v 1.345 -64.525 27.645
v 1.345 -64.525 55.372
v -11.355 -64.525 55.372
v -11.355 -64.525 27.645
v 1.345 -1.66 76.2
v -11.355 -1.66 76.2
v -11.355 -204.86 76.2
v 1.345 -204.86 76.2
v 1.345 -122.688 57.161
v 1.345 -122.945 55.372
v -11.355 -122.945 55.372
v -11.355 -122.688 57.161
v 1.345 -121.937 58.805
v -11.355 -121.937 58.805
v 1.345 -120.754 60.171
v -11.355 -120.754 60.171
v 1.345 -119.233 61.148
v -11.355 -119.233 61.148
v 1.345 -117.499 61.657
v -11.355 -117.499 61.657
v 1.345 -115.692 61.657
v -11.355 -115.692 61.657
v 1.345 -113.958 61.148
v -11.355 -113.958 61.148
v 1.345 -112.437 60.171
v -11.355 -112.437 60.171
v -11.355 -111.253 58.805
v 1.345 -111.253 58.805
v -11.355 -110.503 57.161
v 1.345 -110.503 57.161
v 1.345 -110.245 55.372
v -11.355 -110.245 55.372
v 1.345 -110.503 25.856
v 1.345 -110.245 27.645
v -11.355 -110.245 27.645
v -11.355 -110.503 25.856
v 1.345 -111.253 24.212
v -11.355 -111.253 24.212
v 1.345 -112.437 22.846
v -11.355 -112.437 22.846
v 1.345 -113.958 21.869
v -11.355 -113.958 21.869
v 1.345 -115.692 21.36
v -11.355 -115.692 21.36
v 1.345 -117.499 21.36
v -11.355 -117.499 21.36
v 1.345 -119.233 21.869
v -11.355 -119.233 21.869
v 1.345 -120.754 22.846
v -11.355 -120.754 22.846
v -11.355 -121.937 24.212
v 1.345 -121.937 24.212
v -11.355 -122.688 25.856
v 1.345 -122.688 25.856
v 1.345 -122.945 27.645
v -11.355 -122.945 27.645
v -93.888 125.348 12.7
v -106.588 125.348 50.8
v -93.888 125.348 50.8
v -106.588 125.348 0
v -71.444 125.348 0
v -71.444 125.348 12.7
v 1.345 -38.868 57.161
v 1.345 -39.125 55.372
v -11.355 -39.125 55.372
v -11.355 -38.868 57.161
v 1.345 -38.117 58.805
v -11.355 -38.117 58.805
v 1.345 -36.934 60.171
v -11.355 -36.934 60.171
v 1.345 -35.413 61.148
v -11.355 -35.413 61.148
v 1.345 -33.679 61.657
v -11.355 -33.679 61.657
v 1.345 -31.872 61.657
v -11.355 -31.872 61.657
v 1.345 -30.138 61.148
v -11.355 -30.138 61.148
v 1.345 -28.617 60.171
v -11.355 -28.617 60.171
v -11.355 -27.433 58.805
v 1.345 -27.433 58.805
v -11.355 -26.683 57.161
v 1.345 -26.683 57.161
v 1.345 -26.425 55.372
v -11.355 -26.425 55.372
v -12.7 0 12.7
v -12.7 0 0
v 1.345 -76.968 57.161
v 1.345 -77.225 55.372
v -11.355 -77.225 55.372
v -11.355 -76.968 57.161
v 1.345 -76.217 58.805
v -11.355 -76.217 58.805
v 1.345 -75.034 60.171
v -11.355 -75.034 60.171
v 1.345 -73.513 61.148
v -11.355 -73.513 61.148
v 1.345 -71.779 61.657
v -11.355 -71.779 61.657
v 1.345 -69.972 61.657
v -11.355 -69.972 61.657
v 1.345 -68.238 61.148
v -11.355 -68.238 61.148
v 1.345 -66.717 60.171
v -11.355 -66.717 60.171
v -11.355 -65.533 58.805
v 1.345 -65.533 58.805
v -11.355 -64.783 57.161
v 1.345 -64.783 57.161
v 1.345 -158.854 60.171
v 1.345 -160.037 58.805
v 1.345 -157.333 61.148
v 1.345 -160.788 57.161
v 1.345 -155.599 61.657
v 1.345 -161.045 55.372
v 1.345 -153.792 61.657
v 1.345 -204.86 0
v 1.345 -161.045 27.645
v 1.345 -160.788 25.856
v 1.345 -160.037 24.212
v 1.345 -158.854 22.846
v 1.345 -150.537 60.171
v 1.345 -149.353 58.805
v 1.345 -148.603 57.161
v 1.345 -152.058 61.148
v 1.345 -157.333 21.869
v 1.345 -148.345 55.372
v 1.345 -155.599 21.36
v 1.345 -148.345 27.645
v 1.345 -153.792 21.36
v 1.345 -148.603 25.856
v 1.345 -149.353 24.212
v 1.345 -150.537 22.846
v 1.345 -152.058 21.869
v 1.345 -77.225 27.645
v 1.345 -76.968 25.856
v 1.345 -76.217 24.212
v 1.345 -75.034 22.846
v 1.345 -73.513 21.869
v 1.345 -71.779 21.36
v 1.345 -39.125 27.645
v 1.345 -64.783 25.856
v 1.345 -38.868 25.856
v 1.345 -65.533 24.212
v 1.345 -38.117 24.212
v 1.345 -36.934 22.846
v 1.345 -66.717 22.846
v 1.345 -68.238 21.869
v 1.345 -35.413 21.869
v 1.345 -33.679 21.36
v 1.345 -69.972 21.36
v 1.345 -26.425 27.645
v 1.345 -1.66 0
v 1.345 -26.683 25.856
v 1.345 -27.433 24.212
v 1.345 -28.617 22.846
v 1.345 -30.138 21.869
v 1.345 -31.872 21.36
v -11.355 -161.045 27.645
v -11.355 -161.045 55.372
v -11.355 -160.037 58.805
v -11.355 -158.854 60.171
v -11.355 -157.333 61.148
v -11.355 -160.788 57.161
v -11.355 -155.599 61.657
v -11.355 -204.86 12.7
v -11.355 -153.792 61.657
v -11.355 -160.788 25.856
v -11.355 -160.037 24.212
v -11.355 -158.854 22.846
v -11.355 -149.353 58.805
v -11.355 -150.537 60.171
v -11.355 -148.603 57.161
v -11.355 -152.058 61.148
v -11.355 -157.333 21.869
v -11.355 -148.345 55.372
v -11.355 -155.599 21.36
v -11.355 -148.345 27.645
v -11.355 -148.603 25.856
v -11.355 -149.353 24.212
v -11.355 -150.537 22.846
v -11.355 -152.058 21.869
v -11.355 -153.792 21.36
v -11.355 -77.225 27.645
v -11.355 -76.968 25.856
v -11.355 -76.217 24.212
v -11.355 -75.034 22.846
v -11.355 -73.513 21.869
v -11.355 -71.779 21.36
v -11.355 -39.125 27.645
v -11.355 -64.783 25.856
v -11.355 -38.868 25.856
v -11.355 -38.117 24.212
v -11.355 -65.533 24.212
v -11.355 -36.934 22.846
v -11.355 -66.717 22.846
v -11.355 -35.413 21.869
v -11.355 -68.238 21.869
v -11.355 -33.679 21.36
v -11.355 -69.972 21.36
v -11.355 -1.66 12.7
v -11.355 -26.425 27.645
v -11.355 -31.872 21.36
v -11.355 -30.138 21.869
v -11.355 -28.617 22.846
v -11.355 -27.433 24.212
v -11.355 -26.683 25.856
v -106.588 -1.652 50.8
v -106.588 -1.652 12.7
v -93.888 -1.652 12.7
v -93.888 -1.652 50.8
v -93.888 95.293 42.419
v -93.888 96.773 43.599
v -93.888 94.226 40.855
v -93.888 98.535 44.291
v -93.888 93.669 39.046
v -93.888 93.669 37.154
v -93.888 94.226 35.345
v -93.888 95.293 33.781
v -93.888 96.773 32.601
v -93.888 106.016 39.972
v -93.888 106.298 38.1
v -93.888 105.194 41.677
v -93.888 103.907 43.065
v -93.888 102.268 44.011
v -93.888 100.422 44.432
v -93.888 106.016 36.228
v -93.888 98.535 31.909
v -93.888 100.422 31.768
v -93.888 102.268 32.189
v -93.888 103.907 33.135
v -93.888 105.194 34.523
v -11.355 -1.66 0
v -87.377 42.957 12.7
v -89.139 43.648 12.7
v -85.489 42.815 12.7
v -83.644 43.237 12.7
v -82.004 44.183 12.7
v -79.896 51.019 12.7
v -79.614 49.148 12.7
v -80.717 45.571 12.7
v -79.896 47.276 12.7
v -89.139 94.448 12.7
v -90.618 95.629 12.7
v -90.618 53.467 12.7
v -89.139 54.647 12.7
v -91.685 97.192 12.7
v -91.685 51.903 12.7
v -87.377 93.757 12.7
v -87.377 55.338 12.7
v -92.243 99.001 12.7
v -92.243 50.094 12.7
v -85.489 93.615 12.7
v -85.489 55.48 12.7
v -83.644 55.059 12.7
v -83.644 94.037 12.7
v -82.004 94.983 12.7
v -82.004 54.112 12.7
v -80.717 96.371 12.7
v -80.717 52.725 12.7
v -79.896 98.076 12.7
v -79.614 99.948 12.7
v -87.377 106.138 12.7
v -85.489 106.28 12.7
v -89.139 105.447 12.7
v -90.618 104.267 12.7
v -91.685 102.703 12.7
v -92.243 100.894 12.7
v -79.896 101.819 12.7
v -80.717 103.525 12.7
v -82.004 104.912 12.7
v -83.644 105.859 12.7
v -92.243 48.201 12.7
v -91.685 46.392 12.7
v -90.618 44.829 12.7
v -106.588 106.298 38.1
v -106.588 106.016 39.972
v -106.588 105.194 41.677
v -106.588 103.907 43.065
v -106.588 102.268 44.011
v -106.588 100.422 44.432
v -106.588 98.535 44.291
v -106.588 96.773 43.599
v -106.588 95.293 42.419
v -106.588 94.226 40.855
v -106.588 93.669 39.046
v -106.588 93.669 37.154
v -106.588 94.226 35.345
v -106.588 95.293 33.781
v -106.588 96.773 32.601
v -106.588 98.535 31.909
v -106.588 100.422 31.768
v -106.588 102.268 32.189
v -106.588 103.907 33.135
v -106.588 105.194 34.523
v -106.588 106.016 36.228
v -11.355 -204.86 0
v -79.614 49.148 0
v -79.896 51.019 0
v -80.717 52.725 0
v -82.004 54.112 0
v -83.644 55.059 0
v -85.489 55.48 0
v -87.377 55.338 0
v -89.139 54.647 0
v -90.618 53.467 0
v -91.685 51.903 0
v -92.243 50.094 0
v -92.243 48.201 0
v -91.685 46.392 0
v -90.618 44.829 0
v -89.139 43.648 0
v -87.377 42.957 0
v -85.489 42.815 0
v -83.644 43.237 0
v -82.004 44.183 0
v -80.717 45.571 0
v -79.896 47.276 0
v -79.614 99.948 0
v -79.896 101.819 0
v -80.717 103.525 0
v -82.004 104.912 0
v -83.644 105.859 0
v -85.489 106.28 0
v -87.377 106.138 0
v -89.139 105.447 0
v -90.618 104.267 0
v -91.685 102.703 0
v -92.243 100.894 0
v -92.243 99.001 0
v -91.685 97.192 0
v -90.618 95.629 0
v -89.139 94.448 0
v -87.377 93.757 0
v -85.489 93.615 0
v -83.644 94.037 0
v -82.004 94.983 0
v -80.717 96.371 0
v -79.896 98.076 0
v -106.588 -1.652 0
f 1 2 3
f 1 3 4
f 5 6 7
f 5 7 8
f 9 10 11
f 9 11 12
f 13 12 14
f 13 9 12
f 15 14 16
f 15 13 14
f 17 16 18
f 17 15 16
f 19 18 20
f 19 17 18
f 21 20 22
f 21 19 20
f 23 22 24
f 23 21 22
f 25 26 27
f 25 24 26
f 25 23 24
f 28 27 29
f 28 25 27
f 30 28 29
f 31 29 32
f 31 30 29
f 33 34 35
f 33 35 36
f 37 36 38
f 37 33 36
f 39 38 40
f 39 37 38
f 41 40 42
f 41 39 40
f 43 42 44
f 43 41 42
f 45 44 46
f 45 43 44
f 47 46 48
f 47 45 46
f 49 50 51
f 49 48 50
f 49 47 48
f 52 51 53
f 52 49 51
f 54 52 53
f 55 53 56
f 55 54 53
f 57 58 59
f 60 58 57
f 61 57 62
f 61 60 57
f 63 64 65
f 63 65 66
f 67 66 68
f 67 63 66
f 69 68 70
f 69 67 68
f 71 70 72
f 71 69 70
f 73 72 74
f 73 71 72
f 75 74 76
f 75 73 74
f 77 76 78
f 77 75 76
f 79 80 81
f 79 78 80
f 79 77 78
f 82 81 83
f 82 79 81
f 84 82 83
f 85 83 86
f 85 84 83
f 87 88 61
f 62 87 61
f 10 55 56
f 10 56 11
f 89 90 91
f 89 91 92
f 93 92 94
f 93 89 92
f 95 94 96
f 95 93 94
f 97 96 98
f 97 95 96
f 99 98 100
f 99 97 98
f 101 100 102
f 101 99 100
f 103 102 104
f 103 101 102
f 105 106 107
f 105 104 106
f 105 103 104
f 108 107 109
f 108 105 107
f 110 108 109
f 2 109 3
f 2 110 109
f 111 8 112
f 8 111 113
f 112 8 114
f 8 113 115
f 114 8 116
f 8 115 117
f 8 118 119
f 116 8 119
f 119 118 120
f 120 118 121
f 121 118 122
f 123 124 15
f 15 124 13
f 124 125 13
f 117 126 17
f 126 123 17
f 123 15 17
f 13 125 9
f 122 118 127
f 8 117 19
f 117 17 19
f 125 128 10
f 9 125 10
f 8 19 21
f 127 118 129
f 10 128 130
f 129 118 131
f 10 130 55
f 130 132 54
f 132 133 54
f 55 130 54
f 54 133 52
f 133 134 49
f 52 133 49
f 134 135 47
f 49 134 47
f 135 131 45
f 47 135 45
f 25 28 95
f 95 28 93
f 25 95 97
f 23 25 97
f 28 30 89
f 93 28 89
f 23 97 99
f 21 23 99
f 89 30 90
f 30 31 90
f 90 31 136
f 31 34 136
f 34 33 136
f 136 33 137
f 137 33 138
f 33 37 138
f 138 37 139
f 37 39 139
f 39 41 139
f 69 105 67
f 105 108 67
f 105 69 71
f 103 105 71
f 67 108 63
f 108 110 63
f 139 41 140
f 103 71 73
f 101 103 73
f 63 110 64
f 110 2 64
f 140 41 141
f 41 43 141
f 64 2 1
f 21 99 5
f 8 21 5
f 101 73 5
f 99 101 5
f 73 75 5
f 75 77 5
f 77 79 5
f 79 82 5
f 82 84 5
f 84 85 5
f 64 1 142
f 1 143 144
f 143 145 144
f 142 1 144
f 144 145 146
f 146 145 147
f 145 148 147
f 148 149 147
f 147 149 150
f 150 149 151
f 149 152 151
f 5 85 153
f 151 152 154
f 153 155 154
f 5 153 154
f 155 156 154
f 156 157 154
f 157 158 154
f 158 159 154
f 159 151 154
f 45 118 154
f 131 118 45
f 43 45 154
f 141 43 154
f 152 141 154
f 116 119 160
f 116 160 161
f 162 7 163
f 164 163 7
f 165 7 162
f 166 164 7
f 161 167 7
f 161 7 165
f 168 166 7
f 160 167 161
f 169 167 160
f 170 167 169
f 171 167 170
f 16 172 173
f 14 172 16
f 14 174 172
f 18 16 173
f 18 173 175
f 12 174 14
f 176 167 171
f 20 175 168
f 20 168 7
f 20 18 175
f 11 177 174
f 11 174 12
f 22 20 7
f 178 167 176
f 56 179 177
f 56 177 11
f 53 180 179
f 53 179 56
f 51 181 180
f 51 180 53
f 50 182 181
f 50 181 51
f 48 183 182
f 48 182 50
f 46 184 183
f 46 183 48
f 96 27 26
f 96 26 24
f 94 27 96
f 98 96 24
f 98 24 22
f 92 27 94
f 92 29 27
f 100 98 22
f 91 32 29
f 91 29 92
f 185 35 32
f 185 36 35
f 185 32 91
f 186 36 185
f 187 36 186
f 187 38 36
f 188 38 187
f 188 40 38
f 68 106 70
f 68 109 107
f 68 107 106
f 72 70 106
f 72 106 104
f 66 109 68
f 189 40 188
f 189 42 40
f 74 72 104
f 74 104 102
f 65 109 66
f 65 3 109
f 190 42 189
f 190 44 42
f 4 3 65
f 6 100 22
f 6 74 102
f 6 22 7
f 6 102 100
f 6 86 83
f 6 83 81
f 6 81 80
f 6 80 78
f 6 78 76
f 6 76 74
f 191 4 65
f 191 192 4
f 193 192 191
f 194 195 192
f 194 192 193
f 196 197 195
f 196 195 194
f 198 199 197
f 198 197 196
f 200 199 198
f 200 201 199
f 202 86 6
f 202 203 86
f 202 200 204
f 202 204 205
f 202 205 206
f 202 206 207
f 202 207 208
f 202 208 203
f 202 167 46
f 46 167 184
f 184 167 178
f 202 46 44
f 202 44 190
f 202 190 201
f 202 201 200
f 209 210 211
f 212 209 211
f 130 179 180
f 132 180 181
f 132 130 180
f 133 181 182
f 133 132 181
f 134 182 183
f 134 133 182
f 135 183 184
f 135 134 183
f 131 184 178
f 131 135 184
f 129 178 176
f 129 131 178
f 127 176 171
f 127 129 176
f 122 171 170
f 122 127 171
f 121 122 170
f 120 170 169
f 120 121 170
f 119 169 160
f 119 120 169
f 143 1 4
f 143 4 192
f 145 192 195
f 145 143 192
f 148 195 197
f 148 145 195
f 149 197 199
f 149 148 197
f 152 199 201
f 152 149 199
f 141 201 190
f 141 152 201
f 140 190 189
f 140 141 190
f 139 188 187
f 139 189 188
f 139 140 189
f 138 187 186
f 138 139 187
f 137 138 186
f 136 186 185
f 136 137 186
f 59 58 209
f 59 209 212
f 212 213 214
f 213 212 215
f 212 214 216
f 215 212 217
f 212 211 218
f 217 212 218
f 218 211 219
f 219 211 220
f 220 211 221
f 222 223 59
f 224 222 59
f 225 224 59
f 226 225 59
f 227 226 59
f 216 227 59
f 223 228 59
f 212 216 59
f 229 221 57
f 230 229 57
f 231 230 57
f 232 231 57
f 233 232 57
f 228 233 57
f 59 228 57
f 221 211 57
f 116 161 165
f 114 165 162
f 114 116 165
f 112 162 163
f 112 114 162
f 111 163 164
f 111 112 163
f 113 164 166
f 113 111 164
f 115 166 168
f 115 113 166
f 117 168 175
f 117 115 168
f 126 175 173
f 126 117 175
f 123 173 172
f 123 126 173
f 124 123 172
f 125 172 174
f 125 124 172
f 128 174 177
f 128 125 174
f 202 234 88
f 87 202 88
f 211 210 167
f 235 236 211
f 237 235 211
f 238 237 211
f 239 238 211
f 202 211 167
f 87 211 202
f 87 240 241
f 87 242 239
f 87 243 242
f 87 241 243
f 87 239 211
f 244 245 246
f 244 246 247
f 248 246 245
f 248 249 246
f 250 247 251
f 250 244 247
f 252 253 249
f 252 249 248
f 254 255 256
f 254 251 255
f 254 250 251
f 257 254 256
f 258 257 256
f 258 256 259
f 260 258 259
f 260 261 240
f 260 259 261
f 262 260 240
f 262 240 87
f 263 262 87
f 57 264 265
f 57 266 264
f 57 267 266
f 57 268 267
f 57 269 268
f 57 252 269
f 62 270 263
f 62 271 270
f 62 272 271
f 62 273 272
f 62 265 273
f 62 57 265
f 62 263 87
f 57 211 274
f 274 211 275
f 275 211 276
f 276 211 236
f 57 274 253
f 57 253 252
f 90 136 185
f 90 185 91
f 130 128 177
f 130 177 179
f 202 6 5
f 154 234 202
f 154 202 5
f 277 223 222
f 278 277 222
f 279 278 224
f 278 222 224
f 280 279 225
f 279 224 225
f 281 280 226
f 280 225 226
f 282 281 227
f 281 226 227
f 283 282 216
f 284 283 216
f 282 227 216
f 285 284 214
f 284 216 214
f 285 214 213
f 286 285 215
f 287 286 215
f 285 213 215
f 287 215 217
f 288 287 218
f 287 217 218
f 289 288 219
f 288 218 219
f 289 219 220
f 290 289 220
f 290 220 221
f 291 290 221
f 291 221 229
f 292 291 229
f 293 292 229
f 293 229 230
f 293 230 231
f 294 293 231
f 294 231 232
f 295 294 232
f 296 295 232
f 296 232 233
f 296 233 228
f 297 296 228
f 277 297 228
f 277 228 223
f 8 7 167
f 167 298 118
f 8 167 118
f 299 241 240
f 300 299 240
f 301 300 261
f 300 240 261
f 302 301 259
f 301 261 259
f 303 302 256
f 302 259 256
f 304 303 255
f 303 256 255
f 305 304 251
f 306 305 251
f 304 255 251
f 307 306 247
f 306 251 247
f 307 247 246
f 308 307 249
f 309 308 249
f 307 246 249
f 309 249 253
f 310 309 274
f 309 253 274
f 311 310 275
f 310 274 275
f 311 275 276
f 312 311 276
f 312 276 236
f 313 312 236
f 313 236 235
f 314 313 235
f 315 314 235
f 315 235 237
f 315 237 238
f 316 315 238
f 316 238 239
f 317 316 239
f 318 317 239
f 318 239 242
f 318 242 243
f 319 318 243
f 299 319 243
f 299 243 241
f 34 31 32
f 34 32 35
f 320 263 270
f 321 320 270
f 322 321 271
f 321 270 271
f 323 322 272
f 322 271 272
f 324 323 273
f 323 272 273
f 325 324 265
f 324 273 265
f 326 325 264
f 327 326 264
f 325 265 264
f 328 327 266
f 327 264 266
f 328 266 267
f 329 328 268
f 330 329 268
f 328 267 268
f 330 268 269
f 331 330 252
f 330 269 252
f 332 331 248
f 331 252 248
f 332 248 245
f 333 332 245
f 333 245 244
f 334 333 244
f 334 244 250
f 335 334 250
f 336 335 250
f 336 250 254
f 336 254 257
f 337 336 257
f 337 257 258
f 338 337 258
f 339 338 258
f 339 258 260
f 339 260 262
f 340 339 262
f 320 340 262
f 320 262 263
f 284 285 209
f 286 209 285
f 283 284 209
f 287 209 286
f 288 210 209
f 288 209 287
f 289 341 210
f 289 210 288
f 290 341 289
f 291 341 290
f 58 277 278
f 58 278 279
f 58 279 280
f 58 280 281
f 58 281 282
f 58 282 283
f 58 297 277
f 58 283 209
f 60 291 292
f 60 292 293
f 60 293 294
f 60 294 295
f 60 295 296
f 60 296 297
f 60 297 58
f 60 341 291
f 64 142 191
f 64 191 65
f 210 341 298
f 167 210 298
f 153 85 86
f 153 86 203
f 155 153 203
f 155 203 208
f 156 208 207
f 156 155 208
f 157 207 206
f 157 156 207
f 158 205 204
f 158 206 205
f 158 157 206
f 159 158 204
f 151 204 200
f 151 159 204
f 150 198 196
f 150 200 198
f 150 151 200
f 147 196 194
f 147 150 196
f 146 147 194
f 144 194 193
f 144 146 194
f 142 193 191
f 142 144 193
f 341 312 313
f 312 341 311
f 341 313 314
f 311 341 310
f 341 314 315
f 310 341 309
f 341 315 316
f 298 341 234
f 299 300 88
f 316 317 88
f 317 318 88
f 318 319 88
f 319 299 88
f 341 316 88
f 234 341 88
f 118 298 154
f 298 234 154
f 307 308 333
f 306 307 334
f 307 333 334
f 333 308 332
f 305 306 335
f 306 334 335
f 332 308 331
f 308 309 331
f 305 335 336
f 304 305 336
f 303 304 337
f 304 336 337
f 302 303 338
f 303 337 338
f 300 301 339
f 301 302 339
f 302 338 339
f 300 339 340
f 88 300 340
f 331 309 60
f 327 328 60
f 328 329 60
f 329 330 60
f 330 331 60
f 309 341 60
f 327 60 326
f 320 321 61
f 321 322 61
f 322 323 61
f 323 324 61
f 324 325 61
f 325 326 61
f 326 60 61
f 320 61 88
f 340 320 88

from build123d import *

# Parameters (mm, degrees)
EXTRUDE1_DEPTH          = 12.7
SKETCH2_W               = 12.7
SKETCH2_H               = 127
EXTRUDE2_DEPTH          = 38.1
SKETCH3_W               = 12.7
SKETCH3_H               = 203.2
EXTRUDE3_DEPTH          = 63.5
F_1_2_20_TAPPED_HOLE1_D = 12.7
F_1_2_20_TAPPED_HOLE2_D = 12.7
CUT_EXTRUDE1_REACH      = 109.933


with BuildPart() as part:
    # Sketch1 → Extrude1 (new body)
    with BuildSketch(Plane.XY):
        Polygon((1.34455174, -204.860398808), (1.34455174, -1.660398808), (-11.35544826, -1.660398808), (-12.7, 0), (-71.443804275, 125.347638028), (-106.588300915, 125.347638028), (-106.588300915, -1.652361972), (-11.35544826, -204.860398808), align=None)
    extrude(amount=EXTRUDE1_DEPTH)

    # Sketch2 → Extrude2 (add)
    with BuildSketch(Plane.XY.offset(12.7)):
        with Locations((-100.238300915, 61.847638028)):
            Rectangle(SKETCH2_W, SKETCH2_H)
    extrude(amount=EXTRUDE2_DEPTH)

    # Sketch3 → Extrude3 (add)
    with BuildSketch(Plane.XY.offset(12.7)):
        with Locations((-5.00544826, -103.260398808)):
            Rectangle(SKETCH3_W, SKETCH3_H)
    extrude(amount=EXTRUDE3_DEPTH)

    # 1/2-20 Tapped Hole1 (through all)
    with Locations(Plane(origin=(-106.588300915, 99.947638028, 38.1), x_dir=(0, -1, 0), z_dir=(-1, 0, 0))):
        with Locations((0, 0)):
            Hole(F_1_2_20_TAPPED_HOLE1_D / 2)

    # 1/2-20 Tapped Hole2 (through all)
    with Locations(Plane(origin=(-85.963500915, 99.947638028, 0), x_dir=(-1, 0, 0), z_dir=(0, 0, -1))):
        with Locations((0, 0), (0, -50.8)):
            Hole(F_1_2_20_TAPPED_HOLE2_D / 2)

    # Sketch6 → Cut-Extrude1 (cut, up to next)
    with BuildSketch(Plane(origin=(1.34455174, 0, 0), x_dir=(0, 0, -1), z_dir=(1, 0, 0)), mode=Mode.PRIVATE) as cut_extrude1_sk1:
        with BuildLine():
            Line((-55.372, -26.425398808), (-27.645063582, -26.425398808))
            ThreePointArc((-27.645063582, -26.425398808), (-21.295063582, -32.775398808), (-27.645063582, -39.125398808))
            Line((-27.645063582, -39.125398808), (-55.372, -39.125398808))
            ThreePointArc((-55.372, -39.125398808), (-61.722, -32.775398808), (-55.372, -26.425398808))
        make_face()
    cut_extrude1_tool1 = extrude(cut_extrude1_sk1.sketch, amount=-CUT_EXTRUDE1_REACH, mode=Mode.PRIVATE) & part.part
    add(cut_extrude1_tool1.solids().sort_by_distance((1.344552, -32.775399, 41.508532))[0], mode=Mode.SUBTRACT)
    # Sketch6 → Cut-Extrude1 (cut, up to next)
    with BuildSketch(Plane(origin=(1.34455174, 0, 0), x_dir=(0, 0, -1), z_dir=(1, 0, 0)), mode=Mode.PRIVATE) as cut_extrude1_sk2:
        with BuildLine():
            Line((-55.372, -64.525398808), (-27.645063582, -64.525398808))
            ThreePointArc((-27.645063582, -64.525398808), (-21.295063582, -70.875398808), (-27.645063582, -77.225398808))
            Line((-27.645063582, -77.225398808), (-55.372, -77.225398808))
            ThreePointArc((-55.372, -77.225398808), (-61.722, -70.875398808), (-55.372, -64.525398808))
        make_face()
    cut_extrude1_tool2 = extrude(cut_extrude1_sk2.sketch, amount=-CUT_EXTRUDE1_REACH, mode=Mode.PRIVATE) & part.part
    add(cut_extrude1_tool2.solids().sort_by_distance((1.344552, -70.875399, 41.508532))[0], mode=Mode.SUBTRACT)
    # Sketch6 → Cut-Extrude1 (cut, up to next)
    with BuildSketch(Plane(origin=(1.34455174, 0, 0), x_dir=(0, 0, -1), z_dir=(1, 0, 0)), mode=Mode.PRIVATE) as cut_extrude1_sk3:
        with BuildLine():
            Line((-55.372, -110.245398808), (-27.645063582, -110.245398808))
            ThreePointArc((-27.645063582, -110.245398808), (-21.295063582, -116.595398808), (-27.645063582, -122.945398808))
            Line((-27.645063582, -122.945398808), (-55.372, -122.945398808))
            ThreePointArc((-55.372, -122.945398808), (-61.722, -116.595398808), (-55.372, -110.245398808))
        make_face()
    cut_extrude1_tool3 = extrude(cut_extrude1_sk3.sketch, amount=-CUT_EXTRUDE1_REACH, mode=Mode.PRIVATE) & part.part
    add(cut_extrude1_tool3.solids().sort_by_distance((1.344552, -116.595399, 41.508532))[0], mode=Mode.SUBTRACT)
    # Sketch6 → Cut-Extrude1 (cut, up to next)
    with BuildSketch(Plane(origin=(1.34455174, 0, 0), x_dir=(0, 0, -1), z_dir=(1, 0, 0)), mode=Mode.PRIVATE) as cut_extrude1_sk4:
        with BuildLine():
            Line((-55.372, -148.345398808), (-27.645063582, -148.345398808))
            ThreePointArc((-27.645063582, -148.345398808), (-21.295063582, -154.695398808), (-27.645063582, -161.045398808))
            Line((-27.645063582, -161.045398808), (-55.372, -161.045398808))
            ThreePointArc((-55.372, -161.045398808), (-61.722, -154.695398808), (-55.372, -148.345398808))
        make_face()
    cut_extrude1_tool4 = extrude(cut_extrude1_sk4.sketch, amount=-CUT_EXTRUDE1_REACH, mode=Mode.PRIVATE) & part.part
    add(cut_extrude1_tool4.solids().sort_by_distance((1.344552, -154.695399, 41.508532))[0], mode=Mode.SUBTRACT)


solid = part.part
